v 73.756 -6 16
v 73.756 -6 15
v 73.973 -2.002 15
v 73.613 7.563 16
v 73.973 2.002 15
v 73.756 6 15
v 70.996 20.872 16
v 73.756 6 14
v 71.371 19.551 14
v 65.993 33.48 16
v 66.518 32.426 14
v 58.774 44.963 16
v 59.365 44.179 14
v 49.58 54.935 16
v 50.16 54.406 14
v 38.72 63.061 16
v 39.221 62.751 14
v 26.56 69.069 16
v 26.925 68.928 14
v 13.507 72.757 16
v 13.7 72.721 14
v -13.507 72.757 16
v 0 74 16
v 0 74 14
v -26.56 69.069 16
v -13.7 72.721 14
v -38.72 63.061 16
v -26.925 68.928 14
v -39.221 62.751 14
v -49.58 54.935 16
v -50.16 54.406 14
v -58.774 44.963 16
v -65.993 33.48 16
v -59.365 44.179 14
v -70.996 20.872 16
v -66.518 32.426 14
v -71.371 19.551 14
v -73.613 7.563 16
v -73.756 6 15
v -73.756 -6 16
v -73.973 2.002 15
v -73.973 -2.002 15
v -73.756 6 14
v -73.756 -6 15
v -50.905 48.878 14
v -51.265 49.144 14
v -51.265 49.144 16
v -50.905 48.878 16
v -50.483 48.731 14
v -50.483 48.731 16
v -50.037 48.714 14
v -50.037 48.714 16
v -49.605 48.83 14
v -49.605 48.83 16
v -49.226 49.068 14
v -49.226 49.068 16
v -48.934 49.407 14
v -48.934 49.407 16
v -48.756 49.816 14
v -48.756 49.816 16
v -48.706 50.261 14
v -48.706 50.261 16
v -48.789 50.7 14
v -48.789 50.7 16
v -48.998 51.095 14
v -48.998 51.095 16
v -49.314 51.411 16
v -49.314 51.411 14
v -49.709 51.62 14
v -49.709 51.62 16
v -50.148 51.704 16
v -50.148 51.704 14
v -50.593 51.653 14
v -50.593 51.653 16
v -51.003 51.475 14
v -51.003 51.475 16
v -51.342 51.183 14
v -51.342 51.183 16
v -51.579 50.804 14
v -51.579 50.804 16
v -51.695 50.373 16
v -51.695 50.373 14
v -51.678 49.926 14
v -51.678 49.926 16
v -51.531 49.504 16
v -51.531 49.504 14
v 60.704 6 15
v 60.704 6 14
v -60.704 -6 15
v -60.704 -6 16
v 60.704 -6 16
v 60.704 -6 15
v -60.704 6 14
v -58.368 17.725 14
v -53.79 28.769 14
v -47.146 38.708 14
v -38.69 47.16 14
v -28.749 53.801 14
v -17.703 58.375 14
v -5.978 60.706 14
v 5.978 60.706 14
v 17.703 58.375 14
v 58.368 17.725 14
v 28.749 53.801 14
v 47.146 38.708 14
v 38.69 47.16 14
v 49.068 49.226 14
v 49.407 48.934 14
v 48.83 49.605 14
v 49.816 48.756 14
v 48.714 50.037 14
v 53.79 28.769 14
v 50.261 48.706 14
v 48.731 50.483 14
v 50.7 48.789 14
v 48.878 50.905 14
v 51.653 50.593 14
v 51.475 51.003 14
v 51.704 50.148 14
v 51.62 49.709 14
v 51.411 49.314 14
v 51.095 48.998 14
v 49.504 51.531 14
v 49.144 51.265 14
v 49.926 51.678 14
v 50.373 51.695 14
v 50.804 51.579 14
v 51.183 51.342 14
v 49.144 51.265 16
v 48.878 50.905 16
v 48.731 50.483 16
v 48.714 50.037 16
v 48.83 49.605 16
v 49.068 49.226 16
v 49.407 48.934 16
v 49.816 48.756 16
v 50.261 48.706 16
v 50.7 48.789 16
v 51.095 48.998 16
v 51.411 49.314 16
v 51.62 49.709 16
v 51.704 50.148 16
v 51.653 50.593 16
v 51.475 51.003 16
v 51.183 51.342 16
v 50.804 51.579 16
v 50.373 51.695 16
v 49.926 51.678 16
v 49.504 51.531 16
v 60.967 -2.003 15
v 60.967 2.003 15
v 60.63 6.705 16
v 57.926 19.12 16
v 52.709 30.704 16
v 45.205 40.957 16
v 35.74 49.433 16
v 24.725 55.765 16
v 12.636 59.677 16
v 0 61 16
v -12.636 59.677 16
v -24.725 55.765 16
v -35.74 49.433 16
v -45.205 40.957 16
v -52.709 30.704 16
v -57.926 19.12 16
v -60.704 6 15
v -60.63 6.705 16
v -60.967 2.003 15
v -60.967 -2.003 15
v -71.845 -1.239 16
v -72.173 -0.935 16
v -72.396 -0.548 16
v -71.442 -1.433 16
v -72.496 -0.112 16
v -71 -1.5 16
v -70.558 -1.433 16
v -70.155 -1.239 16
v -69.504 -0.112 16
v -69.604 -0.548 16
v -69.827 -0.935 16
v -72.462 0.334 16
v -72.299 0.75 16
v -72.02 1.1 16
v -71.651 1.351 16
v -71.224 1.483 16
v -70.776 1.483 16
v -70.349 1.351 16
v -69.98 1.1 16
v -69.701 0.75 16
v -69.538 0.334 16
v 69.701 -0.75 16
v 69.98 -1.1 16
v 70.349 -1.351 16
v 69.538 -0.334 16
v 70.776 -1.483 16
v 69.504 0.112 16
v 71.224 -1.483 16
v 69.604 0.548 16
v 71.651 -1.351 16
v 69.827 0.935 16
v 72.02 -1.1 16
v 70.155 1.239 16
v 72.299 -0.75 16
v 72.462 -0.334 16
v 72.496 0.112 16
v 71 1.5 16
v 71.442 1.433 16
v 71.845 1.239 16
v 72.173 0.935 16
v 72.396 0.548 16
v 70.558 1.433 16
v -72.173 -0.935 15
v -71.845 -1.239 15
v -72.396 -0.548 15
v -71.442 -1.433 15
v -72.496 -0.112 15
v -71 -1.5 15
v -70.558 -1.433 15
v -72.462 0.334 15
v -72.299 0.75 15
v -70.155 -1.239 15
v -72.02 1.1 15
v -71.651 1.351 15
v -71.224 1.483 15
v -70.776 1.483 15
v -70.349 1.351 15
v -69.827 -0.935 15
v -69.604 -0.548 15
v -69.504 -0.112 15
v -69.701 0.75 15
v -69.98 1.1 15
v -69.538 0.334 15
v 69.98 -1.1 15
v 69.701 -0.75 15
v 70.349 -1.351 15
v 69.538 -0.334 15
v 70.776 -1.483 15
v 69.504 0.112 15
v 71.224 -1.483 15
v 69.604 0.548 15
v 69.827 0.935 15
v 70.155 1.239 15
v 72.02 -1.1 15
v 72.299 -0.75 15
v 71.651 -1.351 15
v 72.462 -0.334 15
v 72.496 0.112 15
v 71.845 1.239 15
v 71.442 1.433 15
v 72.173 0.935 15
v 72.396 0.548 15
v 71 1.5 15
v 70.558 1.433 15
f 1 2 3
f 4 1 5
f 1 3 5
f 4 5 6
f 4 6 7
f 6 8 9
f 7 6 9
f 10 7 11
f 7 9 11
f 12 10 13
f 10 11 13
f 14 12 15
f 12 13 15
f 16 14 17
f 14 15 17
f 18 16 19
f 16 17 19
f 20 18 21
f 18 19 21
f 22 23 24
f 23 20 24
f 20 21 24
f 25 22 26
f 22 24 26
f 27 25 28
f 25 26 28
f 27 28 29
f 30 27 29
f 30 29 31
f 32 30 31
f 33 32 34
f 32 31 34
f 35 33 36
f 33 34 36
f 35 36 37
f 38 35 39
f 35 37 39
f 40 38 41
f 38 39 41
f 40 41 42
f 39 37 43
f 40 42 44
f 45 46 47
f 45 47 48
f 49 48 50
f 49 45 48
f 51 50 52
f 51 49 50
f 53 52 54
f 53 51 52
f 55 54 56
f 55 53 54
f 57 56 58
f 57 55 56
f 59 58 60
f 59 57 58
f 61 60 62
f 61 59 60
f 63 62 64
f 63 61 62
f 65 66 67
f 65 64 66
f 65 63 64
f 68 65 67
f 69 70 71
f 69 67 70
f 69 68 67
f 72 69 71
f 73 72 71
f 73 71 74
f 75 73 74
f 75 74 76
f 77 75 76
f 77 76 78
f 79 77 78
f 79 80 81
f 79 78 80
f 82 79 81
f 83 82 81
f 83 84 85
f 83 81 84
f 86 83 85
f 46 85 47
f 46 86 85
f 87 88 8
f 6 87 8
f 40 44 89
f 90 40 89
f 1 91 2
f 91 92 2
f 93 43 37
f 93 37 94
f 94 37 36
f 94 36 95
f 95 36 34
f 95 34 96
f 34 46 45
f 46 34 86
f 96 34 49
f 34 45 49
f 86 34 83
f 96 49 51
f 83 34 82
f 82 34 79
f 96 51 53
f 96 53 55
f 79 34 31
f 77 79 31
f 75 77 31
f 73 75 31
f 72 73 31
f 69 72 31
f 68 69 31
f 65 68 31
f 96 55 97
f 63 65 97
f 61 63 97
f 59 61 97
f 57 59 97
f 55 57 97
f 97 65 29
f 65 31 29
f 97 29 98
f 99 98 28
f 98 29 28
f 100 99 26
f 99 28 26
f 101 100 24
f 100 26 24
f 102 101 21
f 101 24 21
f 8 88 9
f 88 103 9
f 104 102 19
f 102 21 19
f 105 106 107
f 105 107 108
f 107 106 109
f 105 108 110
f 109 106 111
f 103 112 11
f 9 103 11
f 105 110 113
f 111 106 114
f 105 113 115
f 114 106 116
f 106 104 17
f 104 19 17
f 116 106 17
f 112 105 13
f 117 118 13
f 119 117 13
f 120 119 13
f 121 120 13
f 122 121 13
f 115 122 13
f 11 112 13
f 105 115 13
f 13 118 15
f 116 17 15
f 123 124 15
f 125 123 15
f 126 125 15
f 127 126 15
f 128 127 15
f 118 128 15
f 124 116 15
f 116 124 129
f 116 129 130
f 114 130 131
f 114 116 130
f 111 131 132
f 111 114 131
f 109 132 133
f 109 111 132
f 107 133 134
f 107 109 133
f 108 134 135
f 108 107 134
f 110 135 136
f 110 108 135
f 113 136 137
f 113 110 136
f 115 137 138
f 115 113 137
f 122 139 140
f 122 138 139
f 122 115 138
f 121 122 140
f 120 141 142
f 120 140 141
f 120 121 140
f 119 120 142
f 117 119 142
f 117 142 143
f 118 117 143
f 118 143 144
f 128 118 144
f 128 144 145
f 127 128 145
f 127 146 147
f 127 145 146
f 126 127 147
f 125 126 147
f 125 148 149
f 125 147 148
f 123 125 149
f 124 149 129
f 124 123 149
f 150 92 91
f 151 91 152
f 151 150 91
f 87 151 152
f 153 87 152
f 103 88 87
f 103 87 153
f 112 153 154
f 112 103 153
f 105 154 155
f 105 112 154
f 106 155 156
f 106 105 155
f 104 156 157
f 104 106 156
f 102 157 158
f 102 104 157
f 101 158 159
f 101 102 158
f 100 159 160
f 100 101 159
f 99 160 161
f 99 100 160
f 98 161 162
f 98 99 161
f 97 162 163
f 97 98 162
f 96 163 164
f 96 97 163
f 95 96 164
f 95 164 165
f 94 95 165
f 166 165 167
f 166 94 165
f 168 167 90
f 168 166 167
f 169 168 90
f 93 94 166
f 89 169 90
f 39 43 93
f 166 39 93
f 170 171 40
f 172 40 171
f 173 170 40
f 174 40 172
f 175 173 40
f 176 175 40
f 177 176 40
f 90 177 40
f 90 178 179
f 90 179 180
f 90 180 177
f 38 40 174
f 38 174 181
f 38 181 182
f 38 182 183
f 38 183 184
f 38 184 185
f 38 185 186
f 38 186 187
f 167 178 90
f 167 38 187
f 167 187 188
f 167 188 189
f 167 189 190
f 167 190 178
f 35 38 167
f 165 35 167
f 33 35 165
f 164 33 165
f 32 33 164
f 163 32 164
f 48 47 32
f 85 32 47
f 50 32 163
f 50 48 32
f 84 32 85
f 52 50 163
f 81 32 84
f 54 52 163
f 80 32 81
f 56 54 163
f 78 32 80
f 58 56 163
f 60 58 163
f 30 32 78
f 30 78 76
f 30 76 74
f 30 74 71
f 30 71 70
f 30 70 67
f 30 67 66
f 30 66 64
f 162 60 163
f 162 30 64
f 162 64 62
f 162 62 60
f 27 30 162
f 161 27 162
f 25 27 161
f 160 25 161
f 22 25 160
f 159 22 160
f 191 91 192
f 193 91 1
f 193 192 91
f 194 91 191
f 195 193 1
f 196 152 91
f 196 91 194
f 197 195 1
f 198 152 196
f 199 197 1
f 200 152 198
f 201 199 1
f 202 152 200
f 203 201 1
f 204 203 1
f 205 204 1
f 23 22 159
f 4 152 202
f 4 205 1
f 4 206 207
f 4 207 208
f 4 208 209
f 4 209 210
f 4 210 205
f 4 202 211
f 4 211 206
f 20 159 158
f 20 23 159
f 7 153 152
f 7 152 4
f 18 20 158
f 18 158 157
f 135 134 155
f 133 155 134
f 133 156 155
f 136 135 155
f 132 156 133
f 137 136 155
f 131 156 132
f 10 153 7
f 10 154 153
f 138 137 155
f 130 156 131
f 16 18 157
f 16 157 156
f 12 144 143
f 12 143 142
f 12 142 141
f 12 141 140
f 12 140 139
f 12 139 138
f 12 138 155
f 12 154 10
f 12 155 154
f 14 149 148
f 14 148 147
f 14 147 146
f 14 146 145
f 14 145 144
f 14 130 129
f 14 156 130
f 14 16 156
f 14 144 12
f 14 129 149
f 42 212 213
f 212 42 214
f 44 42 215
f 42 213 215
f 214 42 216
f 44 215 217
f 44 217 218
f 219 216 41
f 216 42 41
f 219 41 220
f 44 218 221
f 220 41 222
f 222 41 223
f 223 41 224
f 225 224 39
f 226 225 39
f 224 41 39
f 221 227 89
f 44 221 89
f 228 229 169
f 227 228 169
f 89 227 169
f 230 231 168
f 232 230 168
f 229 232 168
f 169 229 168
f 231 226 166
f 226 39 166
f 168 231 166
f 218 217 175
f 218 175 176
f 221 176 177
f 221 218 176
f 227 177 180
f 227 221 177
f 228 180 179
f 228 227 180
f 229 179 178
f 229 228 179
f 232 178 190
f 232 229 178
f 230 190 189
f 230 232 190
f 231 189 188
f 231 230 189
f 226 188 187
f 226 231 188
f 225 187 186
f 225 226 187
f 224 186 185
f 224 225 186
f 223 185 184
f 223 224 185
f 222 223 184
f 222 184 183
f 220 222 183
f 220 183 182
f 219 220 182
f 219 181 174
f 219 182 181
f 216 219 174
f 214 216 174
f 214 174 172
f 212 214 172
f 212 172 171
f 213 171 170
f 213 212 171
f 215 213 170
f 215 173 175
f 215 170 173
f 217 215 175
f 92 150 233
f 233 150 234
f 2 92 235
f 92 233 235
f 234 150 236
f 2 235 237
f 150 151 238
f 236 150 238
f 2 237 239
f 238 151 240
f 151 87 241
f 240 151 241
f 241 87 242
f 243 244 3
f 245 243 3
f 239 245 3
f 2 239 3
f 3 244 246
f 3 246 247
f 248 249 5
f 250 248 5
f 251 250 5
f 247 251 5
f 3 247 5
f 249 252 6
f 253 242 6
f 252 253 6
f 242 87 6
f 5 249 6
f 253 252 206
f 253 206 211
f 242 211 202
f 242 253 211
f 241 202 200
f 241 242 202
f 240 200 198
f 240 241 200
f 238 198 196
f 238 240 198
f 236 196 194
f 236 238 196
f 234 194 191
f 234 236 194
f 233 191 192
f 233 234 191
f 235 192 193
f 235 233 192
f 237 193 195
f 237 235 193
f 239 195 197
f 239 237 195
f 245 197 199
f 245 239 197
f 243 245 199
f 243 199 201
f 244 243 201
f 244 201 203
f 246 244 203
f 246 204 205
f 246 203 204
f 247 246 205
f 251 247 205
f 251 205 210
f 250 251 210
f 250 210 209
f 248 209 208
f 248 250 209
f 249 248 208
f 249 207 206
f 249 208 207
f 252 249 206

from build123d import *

# Parameters (mm, degrees)
BOX001_W                    = 180
BOX001_H                    = 180
BOX001_DEPTH                = 2
BOX_W                       = 180
BOX_H                       = 180
BOX_DEPTH                   = 1
CYLINDER494_R               = 1.5
CYLINDER494_DEPTH           = 60
CYLINDER494_PLACEMENT_ANGLE = 45
CYLINDER495_R               = 1.5
CYLINDER495_DEPTH           = 60
CYLINDER496_R               = 1.5
CYLINDER496_DEPTH           = 60
CYLINDER496_PLACEMENT_ANGLE = 135
CYLINDER498_R               = 1.5
CYLINDER498_DEPTH           = 60
CYLINDER498_PLACEMENT_ANGLE = 225
CYLINDER499_R               = 1.5
CYLINDER499_DEPTH           = 60
CYLINDER500_R               = 1.5
CYLINDER500_DEPTH           = 60
CYLINDER500_PLACEMENT_ANGLE = 45
CYLINDER_R                  = 1.5
CYLINDER_DEPTH              = 60
TUBE029_R                   = 74
TUBE029_R_2                 = 61
TUBE029_DEPTH               = 2


with BuildPart() as krychle001:
    # Box001 → Box001 (new body)
    with BuildSketch(Plane(origin=(-90, -186, 14), x_dir=(1, 0, 0), z_dir=(0, 0, 1))):
        with Locations((90, 90)):
            Rectangle(BOX001_W, BOX001_H)
    extrude(amount=BOX001_DEPTH)


with BuildPart() as krychle:
    # Box → Box (new body)
    with BuildSketch(Plane(origin=(-90, -174, 14), x_dir=(1, 0, 0), z_dir=(0, 0, 1))):
        with Locations((90, 90)):
            Rectangle(BOX_W, BOX_H)
    extrude(amount=BOX_DEPTH)


with BuildPart() as v_lec494:
    # Cylinder494 → Cylinder494 (new body)
    with BuildSketch(Plane.XY):
        Circle(CYLINDER494_R)
    extrude(amount=CYLINDER494_DEPTH)


with BuildPart() as v_lec494_1:
    # Cylinder494 placement: moved
    add(v_lec494.part.moved(Location((50.204581, -50.204581, 0))).rotate(Axis((50.204581, -50.204581, 0), (0, 0, 1)), CYLINDER494_PLACEMENT_ANGLE))


with BuildPart() as v_lec495:
    # Cylinder495 → Cylinder495 (new body)
    with BuildSketch(Plane(origin=(71, 0, 0), x_dir=(0, 1, 0), z_dir=(0, 0, 1))):
        Circle(CYLINDER495_R)
    extrude(amount=CYLINDER495_DEPTH)


with BuildPart() as v_lec496:
    # Cylinder496 → Cylinder496 (new body)
    with BuildSketch(Plane.XY):
        Circle(CYLINDER496_R)
    extrude(amount=CYLINDER496_DEPTH)


with BuildPart() as v_lec496_1:
    # Cylinder496 placement: moved
    add(v_lec496.part.moved(Location((50.204581, 50.204581, 0))).rotate(Axis((50.204581, 50.204581, 0), (0, 0, 1)), CYLINDER496_PLACEMENT_ANGLE))


with BuildPart() as v_lec498:
    # Cylinder498 → Cylinder498 (new body)
    with BuildSketch(Plane.XY):
        Circle(CYLINDER498_R)
    extrude(amount=CYLINDER498_DEPTH)


with BuildPart() as v_lec498_1:
    # Cylinder498 placement: moved
    add(v_lec498.part.moved(Location((-50.204581, 50.204581, 0))).rotate(Axis((-50.204581, 50.204581, 0), (0, 0, 1)), CYLINDER498_PLACEMENT_ANGLE))


with BuildPart() as v_lec499:
    # Cylinder499 → Cylinder499 (new body)
    with BuildSketch(Plane(origin=(-71, 0, 0), x_dir=(0, -1, 0), z_dir=(0, 0, 1))):
        Circle(CYLINDER499_R)
    extrude(amount=CYLINDER499_DEPTH)


with BuildPart() as v_lec500:
    # Cylinder500 → Cylinder500 (new body)
    with BuildSketch(Plane.XY):
        Circle(CYLINDER500_R)
    extrude(amount=CYLINDER500_DEPTH)


with BuildPart() as v_lec500_1:
    # Cylinder500 placement: moved
    add(v_lec500.part.moved(Location((-50.204581, -50.204581, 0))).rotate(Axis((-50.204581, -50.204581, 0), (0, 0, -1)), CYLINDER500_PLACEMENT_ANGLE))


with BuildPart() as compound330:
    # Cylinder → Cylinder (new body)
    with BuildSketch(Plane(origin=(0, -71, 0), x_dir=(1, 0, 0), z_dir=(0, 0, 1))):
        Circle(CYLINDER_R)
    extrude(amount=CYLINDER_DEPTH)

    # Compound330: union Válec494, Válec495, Válec496, Válec498, Válec499, Válec500
    add(v_lec494_1.part)
    add(v_lec495.part)
    add(v_lec496_1.part)
    add(v_lec498_1.part)
    add(v_lec499.part)
    add(v_lec500_1.part)


with BuildPart() as bazovina_part_g1:
    # Tube029 → Tube029 (new body)
    with BuildSketch(Plane.XY.offset(14)):
        Circle(TUBE029_R)
        Circle(TUBE029_R_2, mode=Mode.SUBTRACT)
    extrude(amount=TUBE029_DEPTH)

    # Cut204: cut Compound330
    add(compound330.part, mode=Mode.SUBTRACT)

    # Cut: cut Krychle
    add(krychle.part, mode=Mode.SUBTRACT)

    # Cut206: cut Krychle001
    add(krychle001.part, mode=Mode.SUBTRACT)


solid = bazovina_part_g1.part
